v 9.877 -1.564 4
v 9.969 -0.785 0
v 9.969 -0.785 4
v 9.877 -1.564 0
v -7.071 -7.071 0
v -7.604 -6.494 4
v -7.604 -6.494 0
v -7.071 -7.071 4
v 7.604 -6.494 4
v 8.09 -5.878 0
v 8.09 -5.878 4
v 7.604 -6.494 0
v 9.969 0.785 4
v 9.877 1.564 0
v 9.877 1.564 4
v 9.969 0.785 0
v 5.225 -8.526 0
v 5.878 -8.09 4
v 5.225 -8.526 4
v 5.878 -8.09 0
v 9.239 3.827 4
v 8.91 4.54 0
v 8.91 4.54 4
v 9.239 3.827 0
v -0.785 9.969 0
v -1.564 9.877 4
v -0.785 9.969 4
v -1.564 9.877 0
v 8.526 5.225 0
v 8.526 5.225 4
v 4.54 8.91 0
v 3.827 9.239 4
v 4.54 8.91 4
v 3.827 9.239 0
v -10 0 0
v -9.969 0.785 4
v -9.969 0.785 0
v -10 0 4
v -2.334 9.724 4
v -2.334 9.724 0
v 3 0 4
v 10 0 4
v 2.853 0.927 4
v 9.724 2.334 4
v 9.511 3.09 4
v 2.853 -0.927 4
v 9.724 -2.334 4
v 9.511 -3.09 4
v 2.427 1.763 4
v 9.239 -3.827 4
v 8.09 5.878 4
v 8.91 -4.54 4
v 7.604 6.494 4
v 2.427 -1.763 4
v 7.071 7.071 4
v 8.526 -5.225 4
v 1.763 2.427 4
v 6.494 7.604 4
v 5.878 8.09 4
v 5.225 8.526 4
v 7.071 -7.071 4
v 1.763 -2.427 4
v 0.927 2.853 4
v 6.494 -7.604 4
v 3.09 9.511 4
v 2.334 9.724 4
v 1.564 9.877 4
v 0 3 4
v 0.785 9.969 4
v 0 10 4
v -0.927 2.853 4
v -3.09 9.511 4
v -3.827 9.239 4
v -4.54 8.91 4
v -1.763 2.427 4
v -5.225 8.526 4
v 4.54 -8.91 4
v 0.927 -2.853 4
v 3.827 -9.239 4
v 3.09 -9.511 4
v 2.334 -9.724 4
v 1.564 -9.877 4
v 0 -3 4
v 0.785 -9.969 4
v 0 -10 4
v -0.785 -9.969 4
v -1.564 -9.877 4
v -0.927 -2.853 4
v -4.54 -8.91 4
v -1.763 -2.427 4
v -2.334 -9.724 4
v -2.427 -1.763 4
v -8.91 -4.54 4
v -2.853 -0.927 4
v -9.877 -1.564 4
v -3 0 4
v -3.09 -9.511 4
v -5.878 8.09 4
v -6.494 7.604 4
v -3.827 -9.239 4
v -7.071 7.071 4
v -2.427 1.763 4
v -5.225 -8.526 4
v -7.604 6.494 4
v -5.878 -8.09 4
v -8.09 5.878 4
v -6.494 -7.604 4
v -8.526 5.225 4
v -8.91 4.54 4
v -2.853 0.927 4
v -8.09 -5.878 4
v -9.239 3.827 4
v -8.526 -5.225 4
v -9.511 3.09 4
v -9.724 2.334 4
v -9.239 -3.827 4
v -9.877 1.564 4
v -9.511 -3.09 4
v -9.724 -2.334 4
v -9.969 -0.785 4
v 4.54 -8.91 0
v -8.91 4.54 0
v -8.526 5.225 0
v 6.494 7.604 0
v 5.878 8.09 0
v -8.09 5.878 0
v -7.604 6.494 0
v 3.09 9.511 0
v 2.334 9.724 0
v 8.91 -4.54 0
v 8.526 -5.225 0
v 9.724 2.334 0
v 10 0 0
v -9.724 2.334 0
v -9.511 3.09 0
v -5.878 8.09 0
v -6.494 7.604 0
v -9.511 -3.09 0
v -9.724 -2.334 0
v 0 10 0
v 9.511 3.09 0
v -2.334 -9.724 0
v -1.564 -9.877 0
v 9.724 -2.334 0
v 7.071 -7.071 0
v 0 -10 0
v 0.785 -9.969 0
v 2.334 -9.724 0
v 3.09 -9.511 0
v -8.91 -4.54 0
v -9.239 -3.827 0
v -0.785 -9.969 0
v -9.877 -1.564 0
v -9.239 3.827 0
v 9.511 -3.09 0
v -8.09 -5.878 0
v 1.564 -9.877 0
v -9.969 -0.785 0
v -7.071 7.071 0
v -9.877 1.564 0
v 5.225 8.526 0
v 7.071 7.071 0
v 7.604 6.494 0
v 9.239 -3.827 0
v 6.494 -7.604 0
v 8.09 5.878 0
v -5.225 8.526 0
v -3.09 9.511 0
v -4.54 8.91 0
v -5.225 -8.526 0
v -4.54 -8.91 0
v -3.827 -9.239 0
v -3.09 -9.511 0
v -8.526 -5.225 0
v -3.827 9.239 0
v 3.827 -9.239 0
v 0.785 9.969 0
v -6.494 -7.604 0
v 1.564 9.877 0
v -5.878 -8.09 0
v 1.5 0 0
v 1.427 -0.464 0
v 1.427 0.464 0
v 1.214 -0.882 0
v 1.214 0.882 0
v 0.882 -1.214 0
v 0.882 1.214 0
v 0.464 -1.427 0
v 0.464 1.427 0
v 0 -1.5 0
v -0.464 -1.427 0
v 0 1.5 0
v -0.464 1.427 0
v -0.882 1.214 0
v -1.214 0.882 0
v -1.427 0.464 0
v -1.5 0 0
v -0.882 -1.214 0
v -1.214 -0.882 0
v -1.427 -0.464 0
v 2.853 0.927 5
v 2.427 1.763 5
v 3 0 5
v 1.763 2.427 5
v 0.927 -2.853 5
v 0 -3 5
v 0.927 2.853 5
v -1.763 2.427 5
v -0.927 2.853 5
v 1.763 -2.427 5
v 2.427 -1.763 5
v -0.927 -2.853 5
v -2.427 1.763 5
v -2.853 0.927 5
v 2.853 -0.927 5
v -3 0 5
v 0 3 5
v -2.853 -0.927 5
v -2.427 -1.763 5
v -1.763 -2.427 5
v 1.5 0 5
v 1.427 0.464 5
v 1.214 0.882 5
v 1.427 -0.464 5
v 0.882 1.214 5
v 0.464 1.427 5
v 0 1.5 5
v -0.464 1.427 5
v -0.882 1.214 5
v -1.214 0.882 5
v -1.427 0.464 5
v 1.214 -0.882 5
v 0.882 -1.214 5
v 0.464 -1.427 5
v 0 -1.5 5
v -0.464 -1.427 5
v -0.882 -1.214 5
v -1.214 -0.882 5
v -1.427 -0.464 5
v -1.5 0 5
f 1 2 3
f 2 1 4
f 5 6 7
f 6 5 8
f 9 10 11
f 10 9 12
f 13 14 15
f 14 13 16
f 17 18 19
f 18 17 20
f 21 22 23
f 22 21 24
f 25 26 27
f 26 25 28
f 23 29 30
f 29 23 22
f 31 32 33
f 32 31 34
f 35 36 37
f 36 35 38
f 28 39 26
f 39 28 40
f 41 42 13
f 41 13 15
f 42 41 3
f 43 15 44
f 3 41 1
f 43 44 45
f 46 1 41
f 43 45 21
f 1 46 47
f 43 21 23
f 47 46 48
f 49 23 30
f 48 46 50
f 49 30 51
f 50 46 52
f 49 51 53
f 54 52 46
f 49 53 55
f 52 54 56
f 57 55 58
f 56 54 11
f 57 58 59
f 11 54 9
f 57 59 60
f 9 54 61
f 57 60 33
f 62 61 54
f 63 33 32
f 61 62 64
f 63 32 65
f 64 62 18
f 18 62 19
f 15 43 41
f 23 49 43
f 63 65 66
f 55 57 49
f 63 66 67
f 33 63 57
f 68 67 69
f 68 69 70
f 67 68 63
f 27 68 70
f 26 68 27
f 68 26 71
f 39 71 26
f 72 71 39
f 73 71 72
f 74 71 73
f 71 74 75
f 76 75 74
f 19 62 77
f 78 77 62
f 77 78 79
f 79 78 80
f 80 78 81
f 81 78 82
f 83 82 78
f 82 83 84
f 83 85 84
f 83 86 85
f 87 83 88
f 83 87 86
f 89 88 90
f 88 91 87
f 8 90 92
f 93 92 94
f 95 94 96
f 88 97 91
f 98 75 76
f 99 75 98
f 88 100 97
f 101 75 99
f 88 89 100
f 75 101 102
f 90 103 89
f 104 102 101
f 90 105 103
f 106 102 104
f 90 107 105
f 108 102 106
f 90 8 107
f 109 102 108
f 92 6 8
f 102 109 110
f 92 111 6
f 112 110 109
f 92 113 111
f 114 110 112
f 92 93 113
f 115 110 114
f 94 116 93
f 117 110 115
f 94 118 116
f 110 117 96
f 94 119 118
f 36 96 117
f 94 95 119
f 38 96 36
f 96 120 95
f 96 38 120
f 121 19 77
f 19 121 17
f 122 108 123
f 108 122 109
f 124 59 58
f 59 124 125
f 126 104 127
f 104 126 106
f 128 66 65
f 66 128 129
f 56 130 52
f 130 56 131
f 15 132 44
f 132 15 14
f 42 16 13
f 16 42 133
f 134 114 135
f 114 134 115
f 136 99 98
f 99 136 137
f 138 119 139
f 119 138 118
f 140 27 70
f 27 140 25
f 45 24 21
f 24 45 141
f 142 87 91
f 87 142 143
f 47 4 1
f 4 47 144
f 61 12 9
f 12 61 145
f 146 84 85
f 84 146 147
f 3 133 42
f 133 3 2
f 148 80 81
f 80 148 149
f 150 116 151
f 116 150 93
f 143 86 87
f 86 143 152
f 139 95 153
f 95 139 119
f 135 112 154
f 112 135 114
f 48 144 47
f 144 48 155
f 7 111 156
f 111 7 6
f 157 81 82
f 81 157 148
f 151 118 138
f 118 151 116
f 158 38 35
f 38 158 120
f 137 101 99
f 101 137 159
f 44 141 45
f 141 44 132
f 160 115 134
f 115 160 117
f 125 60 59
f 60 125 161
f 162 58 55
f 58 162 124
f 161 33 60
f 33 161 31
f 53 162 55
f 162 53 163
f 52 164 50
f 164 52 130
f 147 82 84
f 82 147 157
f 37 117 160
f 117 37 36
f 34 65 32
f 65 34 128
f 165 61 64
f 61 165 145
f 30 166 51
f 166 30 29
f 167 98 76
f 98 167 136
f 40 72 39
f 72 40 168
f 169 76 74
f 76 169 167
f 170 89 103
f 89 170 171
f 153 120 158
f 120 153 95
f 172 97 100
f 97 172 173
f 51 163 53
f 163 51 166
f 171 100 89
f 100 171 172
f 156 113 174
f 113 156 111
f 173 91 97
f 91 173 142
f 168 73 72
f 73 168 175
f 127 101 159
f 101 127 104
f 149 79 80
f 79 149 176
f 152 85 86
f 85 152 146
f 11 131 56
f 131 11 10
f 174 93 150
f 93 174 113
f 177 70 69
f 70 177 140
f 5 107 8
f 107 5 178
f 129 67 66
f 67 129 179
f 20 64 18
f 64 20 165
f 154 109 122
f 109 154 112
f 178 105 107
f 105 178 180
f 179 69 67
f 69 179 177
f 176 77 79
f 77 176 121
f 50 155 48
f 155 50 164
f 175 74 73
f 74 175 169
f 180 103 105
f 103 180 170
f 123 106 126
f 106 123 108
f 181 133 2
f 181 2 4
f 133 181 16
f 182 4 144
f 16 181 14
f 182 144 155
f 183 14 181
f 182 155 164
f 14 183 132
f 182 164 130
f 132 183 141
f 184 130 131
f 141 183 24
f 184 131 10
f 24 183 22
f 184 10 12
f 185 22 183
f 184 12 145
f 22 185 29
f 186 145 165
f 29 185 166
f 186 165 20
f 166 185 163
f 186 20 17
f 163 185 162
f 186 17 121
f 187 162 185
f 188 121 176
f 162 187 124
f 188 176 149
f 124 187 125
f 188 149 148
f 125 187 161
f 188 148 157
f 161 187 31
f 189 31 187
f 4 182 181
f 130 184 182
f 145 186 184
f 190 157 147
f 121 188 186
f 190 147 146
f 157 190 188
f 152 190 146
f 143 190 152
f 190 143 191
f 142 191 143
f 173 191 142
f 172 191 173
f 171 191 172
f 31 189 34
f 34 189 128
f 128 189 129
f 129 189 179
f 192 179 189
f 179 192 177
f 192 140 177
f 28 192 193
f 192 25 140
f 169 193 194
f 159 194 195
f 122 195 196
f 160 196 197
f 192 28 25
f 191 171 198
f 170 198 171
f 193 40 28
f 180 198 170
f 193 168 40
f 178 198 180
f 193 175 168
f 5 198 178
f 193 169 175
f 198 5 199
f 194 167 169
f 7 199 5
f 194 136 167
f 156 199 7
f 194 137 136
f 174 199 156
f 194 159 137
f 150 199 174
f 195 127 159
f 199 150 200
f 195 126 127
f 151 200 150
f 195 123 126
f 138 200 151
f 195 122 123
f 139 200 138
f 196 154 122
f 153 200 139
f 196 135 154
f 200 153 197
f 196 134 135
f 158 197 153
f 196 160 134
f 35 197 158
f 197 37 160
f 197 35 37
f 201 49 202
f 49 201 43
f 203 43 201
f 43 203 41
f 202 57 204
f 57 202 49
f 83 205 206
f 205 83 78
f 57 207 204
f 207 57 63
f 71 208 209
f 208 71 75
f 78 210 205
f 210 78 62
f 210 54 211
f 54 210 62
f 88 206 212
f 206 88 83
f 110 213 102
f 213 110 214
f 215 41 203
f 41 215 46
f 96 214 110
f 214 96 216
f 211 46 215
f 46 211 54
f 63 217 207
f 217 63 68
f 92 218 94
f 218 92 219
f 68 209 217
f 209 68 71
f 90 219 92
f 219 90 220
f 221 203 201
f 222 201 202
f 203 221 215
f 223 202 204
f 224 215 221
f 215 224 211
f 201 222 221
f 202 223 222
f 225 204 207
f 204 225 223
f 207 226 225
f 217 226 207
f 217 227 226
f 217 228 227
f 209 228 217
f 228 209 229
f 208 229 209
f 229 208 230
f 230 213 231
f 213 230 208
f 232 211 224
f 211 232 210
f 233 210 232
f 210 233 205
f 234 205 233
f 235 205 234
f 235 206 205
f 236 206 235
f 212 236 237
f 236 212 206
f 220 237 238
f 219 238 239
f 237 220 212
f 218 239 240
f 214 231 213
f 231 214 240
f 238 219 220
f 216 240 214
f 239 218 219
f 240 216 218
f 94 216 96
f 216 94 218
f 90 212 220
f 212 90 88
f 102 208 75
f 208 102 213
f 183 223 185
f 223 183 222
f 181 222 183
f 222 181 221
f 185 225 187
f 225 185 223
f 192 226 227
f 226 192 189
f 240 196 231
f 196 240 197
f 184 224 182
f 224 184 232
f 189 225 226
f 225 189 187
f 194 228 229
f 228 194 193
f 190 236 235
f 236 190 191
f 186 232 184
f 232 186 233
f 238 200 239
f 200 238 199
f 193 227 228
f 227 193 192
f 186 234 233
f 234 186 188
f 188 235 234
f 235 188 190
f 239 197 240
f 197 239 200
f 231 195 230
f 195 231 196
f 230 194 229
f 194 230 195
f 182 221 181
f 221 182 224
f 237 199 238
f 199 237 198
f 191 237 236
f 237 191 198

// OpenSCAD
difference(){
    union(){
        translate([0,0,0]) cylinder(4,10,10,$fn=80);
        translate([0,0,4]) cylinder(1,3,3,$fn=20);
    };
    union(){
        translate([0,0,0]) cylinder(5,1.5,1.5,$fn=20);
    };
};
